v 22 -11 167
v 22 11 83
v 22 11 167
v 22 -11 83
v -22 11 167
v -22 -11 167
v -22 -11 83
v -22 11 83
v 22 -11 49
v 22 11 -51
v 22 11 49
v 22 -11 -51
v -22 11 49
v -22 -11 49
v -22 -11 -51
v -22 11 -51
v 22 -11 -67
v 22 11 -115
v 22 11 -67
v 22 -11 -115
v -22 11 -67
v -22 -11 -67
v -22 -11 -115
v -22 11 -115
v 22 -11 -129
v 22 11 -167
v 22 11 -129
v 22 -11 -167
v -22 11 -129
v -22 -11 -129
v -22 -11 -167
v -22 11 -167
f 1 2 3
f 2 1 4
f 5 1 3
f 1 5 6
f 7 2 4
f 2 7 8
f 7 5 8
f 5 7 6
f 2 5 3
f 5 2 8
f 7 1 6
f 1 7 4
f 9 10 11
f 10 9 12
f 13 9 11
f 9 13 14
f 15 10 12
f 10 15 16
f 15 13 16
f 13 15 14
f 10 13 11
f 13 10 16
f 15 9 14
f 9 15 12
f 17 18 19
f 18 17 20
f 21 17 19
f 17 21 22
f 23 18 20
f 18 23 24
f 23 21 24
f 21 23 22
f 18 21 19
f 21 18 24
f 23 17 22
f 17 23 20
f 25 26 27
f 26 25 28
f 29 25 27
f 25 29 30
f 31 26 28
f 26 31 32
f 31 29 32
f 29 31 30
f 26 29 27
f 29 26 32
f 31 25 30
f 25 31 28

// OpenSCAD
// ============================================================================
// Atom Lithography Machine — Parametric OpenSCAD Module (S6.6-03)
// ============================================================================
// part_id           : S6.6-03
// parent_bom_id     : S6.6
// subsystem         : S6
// part_name         : Giris kriyo koaksiyel (SS) + 3x kriyo zayiflatici seti (56 zincir, Exp114)
// material          : 304 SS
// temp_stage        : 300 K -> 20 mK
// vacuum_grade      : Kriyo-vakum
// tolerance         : ±1 dB
// computed_mass_kg  : 0.49051
// envelope_mm       : 44.000 x 22.000 x 334.000
// design_maturity   : M0_M1_DETAILED_CAD_DESIGN_ONLY
// no_lab_measurement: true
// iec61508_certified: false
// semi_s2_certified : false
// Units: millimeters (mm)
// ============================================================================

$fn = 64;

// Nominal bounding envelope parameters (mm)
bbox_x = 44.0000;
bbox_y = 22.0000;
bbox_z = 334.0000;

// Part-specific parametric dimensions
n_chains = 56;
coax_od_mm = 2.19;
att_stages = 3;

// Interface / port parameters (mm)

module part_S6_6_03() {
  union() {
    // Stage 50k_4k thermalized cryo coax loom
    translate([0.000, 0.000, 125.000]) cube([44.000, 22.000, 84.000], center=true);
    // Stage 4k_still thermalized cryo coax loom
    translate([0.000, 0.000, -1.000]) cube([44.000, 22.000, 100.000], center=true);
    // Stage still_cp thermalized cryo coax loom
    translate([0.000, 0.000, -91.000]) cube([44.000, 22.000, 48.000], center=true);
    // Stage cp_mxc thermalized cryo coax loom
    translate([0.000, 0.000, -148.000]) cube([44.000, 22.000, 38.000], center=true);
  }
}

// World assembly mounting transform (global machine frame, mm / deg):
// translate([-650.000, 76.000, 669.000]) rotate([0.000, 0.000, 0.000]) part_S6_6_03();

part_S6_6_03();
